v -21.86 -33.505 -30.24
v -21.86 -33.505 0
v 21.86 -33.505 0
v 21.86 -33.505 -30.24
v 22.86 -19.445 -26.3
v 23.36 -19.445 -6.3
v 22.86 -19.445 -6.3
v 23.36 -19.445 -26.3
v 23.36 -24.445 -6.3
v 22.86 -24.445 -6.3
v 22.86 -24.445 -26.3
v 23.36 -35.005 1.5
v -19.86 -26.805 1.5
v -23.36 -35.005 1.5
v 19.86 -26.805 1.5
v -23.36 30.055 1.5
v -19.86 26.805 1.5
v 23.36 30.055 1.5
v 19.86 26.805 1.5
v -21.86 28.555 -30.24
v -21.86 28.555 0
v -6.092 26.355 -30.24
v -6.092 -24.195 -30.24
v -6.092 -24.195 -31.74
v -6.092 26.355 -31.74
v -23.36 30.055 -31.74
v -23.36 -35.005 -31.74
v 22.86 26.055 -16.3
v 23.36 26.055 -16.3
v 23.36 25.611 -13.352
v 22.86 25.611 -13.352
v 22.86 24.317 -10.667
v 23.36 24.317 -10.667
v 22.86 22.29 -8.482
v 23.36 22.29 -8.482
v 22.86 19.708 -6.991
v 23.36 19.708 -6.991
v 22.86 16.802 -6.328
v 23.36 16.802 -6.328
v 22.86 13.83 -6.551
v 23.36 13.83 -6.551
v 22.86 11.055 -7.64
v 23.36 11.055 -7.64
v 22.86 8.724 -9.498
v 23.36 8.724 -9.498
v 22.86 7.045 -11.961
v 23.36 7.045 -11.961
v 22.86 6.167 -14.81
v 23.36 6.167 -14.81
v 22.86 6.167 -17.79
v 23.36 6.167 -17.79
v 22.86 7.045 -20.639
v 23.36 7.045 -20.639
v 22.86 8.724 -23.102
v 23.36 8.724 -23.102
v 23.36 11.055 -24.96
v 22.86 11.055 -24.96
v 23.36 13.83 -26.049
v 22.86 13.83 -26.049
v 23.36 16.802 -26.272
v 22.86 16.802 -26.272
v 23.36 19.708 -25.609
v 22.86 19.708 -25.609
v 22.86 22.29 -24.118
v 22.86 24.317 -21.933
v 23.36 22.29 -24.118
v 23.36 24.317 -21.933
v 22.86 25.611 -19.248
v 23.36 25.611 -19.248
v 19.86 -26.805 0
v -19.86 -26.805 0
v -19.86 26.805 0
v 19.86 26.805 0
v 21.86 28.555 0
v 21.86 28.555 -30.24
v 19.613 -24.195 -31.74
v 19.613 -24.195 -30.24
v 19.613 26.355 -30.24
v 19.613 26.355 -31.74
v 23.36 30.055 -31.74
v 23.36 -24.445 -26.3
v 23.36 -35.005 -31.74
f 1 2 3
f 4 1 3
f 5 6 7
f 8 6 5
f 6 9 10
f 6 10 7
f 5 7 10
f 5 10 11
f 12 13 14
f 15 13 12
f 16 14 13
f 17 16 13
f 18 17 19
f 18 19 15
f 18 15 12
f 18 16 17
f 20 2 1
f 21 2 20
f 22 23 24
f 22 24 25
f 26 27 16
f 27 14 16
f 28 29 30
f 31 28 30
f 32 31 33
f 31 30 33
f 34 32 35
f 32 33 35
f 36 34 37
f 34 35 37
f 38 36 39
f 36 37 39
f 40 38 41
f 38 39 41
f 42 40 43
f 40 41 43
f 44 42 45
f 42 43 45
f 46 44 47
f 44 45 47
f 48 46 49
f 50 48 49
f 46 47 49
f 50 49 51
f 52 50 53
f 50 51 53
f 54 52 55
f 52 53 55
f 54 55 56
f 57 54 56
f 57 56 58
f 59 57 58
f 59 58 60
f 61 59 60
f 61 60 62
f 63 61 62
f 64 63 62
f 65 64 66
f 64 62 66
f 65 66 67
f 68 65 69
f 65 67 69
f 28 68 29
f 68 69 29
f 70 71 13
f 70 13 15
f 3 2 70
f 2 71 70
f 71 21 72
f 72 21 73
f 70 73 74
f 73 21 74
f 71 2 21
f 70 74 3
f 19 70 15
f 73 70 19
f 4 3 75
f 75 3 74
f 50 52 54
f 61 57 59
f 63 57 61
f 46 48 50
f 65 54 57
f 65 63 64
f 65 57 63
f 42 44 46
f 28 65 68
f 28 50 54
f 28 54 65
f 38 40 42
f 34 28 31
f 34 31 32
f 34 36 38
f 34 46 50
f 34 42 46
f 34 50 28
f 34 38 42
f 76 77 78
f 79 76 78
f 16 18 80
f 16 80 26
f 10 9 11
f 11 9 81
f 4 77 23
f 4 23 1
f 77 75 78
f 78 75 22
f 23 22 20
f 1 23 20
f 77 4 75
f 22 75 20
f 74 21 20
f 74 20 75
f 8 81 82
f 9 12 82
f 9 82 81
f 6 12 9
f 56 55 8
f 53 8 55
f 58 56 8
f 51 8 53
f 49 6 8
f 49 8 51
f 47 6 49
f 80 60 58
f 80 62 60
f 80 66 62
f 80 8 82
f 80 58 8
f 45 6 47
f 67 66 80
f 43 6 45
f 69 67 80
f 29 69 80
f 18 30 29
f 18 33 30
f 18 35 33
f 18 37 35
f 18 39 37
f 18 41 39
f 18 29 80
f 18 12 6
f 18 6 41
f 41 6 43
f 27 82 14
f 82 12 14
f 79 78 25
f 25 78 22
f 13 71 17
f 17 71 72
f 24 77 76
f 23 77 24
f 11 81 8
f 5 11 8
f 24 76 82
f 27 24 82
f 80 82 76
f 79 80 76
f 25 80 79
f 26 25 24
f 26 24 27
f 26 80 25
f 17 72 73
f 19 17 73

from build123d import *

# Parameters (mm, degrees)
SKETCH1_W           = 46.72
SKETCH1_H           = 65.06
SKETCH1_W_2         = 39.72
SKETCH1_H_2         = 53.61
BOSS_EXTRUDE1_DEPTH = 1.5
SKETCH1_3_W         = 46.72
SKETCH1_3_H         = 65.06
SKETCH1_3_W_2       = 43.72
SKETCH1_3_H_2       = 62.06
BOSS_EXTRUDE2_DEPTH = 30.24
SKETCH3_W           = 46.72
SKETCH3_H           = 65.06
SKETCH3_W_2         = 43.72
SKETCH3_H_2         = 62.06
SKETCH3_W_3         = 25.705
SKETCH3_H_3         = 50.55
BOSS_EXTRUDE3_DEPTH = 1.5
SKETCH4_R           = 10
SKETCH4_W           = 20
SKETCH4_H           = 5
CUT_EXTRUDE1_DEPTH  = 0.5


with BuildPart() as part:
    # Sketch1 → Boss-Extrude1 (new body)
    with BuildSketch(Plane.XY):
        with Locations((0, -2.475)):
            Rectangle(SKETCH1_W, SKETCH1_H)
        Rectangle(SKETCH1_W_2, SKETCH1_H_2, mode=Mode.SUBTRACT)
    extrude(amount=BOSS_EXTRUDE1_DEPTH)

    # Sketch1<3> → Boss-Extrude2 (add)
    with BuildSketch(Plane.XY):
        with Locations((0, -2.475)):
            Rectangle(SKETCH1_3_W, SKETCH1_3_H)
        with Locations((0, -2.475)):
            Rectangle(SKETCH1_3_W_2, SKETCH1_3_H_2, mode=Mode.SUBTRACT)
    extrude(amount=-BOSS_EXTRUDE2_DEPTH)

    # Sketch3 → Boss-Extrude3 (add)
    # profile 1 of 2: a face of its own
    with BuildSketch(Plane(origin=(0, 0, -30.24), x_dir=(-1, 0, 0), z_dir=(0, 0, -1))):
        with Locations((0, -2.475)):
            Rectangle(SKETCH3_W, SKETCH3_H)
        with Locations((0, -2.475)):
            Rectangle(SKETCH3_W_2, SKETCH3_H_2, mode=Mode.SUBTRACT)
    # profile 2 of 2: a face of its own
    with BuildSketch(Plane(origin=(0, 0, -30.24), x_dir=(-1, 0, 0), z_dir=(0, 0, -1))):
        with Locations((0, -2.475)):
            Rectangle(SKETCH3_W_2, SKETCH3_H_2)
        with Locations((-6.7605, 1.08)):
            Rectangle(SKETCH3_W_3, SKETCH3_H_3, mode=Mode.SUBTRACT)
    extrude(amount=BOSS_EXTRUDE3_DEPTH)

    # Sketch4 → Cut-Extrude1 (cut)
    with BuildSketch(Plane(origin=(23.36, 0, 0), x_dir=(0, 0, -1), z_dir=(1, 0, 0))):
        with Locations(Location((16.3, 16.055, 0), (0, 0, 90))):
            Circle(SKETCH4_R)
        with Locations((16.3, -21.945)):
            Rectangle(SKETCH4_W, SKETCH4_H)
    extrude(amount=-CUT_EXTRUDE1_DEPTH, mode=Mode.SUBTRACT)


solid = part.part
